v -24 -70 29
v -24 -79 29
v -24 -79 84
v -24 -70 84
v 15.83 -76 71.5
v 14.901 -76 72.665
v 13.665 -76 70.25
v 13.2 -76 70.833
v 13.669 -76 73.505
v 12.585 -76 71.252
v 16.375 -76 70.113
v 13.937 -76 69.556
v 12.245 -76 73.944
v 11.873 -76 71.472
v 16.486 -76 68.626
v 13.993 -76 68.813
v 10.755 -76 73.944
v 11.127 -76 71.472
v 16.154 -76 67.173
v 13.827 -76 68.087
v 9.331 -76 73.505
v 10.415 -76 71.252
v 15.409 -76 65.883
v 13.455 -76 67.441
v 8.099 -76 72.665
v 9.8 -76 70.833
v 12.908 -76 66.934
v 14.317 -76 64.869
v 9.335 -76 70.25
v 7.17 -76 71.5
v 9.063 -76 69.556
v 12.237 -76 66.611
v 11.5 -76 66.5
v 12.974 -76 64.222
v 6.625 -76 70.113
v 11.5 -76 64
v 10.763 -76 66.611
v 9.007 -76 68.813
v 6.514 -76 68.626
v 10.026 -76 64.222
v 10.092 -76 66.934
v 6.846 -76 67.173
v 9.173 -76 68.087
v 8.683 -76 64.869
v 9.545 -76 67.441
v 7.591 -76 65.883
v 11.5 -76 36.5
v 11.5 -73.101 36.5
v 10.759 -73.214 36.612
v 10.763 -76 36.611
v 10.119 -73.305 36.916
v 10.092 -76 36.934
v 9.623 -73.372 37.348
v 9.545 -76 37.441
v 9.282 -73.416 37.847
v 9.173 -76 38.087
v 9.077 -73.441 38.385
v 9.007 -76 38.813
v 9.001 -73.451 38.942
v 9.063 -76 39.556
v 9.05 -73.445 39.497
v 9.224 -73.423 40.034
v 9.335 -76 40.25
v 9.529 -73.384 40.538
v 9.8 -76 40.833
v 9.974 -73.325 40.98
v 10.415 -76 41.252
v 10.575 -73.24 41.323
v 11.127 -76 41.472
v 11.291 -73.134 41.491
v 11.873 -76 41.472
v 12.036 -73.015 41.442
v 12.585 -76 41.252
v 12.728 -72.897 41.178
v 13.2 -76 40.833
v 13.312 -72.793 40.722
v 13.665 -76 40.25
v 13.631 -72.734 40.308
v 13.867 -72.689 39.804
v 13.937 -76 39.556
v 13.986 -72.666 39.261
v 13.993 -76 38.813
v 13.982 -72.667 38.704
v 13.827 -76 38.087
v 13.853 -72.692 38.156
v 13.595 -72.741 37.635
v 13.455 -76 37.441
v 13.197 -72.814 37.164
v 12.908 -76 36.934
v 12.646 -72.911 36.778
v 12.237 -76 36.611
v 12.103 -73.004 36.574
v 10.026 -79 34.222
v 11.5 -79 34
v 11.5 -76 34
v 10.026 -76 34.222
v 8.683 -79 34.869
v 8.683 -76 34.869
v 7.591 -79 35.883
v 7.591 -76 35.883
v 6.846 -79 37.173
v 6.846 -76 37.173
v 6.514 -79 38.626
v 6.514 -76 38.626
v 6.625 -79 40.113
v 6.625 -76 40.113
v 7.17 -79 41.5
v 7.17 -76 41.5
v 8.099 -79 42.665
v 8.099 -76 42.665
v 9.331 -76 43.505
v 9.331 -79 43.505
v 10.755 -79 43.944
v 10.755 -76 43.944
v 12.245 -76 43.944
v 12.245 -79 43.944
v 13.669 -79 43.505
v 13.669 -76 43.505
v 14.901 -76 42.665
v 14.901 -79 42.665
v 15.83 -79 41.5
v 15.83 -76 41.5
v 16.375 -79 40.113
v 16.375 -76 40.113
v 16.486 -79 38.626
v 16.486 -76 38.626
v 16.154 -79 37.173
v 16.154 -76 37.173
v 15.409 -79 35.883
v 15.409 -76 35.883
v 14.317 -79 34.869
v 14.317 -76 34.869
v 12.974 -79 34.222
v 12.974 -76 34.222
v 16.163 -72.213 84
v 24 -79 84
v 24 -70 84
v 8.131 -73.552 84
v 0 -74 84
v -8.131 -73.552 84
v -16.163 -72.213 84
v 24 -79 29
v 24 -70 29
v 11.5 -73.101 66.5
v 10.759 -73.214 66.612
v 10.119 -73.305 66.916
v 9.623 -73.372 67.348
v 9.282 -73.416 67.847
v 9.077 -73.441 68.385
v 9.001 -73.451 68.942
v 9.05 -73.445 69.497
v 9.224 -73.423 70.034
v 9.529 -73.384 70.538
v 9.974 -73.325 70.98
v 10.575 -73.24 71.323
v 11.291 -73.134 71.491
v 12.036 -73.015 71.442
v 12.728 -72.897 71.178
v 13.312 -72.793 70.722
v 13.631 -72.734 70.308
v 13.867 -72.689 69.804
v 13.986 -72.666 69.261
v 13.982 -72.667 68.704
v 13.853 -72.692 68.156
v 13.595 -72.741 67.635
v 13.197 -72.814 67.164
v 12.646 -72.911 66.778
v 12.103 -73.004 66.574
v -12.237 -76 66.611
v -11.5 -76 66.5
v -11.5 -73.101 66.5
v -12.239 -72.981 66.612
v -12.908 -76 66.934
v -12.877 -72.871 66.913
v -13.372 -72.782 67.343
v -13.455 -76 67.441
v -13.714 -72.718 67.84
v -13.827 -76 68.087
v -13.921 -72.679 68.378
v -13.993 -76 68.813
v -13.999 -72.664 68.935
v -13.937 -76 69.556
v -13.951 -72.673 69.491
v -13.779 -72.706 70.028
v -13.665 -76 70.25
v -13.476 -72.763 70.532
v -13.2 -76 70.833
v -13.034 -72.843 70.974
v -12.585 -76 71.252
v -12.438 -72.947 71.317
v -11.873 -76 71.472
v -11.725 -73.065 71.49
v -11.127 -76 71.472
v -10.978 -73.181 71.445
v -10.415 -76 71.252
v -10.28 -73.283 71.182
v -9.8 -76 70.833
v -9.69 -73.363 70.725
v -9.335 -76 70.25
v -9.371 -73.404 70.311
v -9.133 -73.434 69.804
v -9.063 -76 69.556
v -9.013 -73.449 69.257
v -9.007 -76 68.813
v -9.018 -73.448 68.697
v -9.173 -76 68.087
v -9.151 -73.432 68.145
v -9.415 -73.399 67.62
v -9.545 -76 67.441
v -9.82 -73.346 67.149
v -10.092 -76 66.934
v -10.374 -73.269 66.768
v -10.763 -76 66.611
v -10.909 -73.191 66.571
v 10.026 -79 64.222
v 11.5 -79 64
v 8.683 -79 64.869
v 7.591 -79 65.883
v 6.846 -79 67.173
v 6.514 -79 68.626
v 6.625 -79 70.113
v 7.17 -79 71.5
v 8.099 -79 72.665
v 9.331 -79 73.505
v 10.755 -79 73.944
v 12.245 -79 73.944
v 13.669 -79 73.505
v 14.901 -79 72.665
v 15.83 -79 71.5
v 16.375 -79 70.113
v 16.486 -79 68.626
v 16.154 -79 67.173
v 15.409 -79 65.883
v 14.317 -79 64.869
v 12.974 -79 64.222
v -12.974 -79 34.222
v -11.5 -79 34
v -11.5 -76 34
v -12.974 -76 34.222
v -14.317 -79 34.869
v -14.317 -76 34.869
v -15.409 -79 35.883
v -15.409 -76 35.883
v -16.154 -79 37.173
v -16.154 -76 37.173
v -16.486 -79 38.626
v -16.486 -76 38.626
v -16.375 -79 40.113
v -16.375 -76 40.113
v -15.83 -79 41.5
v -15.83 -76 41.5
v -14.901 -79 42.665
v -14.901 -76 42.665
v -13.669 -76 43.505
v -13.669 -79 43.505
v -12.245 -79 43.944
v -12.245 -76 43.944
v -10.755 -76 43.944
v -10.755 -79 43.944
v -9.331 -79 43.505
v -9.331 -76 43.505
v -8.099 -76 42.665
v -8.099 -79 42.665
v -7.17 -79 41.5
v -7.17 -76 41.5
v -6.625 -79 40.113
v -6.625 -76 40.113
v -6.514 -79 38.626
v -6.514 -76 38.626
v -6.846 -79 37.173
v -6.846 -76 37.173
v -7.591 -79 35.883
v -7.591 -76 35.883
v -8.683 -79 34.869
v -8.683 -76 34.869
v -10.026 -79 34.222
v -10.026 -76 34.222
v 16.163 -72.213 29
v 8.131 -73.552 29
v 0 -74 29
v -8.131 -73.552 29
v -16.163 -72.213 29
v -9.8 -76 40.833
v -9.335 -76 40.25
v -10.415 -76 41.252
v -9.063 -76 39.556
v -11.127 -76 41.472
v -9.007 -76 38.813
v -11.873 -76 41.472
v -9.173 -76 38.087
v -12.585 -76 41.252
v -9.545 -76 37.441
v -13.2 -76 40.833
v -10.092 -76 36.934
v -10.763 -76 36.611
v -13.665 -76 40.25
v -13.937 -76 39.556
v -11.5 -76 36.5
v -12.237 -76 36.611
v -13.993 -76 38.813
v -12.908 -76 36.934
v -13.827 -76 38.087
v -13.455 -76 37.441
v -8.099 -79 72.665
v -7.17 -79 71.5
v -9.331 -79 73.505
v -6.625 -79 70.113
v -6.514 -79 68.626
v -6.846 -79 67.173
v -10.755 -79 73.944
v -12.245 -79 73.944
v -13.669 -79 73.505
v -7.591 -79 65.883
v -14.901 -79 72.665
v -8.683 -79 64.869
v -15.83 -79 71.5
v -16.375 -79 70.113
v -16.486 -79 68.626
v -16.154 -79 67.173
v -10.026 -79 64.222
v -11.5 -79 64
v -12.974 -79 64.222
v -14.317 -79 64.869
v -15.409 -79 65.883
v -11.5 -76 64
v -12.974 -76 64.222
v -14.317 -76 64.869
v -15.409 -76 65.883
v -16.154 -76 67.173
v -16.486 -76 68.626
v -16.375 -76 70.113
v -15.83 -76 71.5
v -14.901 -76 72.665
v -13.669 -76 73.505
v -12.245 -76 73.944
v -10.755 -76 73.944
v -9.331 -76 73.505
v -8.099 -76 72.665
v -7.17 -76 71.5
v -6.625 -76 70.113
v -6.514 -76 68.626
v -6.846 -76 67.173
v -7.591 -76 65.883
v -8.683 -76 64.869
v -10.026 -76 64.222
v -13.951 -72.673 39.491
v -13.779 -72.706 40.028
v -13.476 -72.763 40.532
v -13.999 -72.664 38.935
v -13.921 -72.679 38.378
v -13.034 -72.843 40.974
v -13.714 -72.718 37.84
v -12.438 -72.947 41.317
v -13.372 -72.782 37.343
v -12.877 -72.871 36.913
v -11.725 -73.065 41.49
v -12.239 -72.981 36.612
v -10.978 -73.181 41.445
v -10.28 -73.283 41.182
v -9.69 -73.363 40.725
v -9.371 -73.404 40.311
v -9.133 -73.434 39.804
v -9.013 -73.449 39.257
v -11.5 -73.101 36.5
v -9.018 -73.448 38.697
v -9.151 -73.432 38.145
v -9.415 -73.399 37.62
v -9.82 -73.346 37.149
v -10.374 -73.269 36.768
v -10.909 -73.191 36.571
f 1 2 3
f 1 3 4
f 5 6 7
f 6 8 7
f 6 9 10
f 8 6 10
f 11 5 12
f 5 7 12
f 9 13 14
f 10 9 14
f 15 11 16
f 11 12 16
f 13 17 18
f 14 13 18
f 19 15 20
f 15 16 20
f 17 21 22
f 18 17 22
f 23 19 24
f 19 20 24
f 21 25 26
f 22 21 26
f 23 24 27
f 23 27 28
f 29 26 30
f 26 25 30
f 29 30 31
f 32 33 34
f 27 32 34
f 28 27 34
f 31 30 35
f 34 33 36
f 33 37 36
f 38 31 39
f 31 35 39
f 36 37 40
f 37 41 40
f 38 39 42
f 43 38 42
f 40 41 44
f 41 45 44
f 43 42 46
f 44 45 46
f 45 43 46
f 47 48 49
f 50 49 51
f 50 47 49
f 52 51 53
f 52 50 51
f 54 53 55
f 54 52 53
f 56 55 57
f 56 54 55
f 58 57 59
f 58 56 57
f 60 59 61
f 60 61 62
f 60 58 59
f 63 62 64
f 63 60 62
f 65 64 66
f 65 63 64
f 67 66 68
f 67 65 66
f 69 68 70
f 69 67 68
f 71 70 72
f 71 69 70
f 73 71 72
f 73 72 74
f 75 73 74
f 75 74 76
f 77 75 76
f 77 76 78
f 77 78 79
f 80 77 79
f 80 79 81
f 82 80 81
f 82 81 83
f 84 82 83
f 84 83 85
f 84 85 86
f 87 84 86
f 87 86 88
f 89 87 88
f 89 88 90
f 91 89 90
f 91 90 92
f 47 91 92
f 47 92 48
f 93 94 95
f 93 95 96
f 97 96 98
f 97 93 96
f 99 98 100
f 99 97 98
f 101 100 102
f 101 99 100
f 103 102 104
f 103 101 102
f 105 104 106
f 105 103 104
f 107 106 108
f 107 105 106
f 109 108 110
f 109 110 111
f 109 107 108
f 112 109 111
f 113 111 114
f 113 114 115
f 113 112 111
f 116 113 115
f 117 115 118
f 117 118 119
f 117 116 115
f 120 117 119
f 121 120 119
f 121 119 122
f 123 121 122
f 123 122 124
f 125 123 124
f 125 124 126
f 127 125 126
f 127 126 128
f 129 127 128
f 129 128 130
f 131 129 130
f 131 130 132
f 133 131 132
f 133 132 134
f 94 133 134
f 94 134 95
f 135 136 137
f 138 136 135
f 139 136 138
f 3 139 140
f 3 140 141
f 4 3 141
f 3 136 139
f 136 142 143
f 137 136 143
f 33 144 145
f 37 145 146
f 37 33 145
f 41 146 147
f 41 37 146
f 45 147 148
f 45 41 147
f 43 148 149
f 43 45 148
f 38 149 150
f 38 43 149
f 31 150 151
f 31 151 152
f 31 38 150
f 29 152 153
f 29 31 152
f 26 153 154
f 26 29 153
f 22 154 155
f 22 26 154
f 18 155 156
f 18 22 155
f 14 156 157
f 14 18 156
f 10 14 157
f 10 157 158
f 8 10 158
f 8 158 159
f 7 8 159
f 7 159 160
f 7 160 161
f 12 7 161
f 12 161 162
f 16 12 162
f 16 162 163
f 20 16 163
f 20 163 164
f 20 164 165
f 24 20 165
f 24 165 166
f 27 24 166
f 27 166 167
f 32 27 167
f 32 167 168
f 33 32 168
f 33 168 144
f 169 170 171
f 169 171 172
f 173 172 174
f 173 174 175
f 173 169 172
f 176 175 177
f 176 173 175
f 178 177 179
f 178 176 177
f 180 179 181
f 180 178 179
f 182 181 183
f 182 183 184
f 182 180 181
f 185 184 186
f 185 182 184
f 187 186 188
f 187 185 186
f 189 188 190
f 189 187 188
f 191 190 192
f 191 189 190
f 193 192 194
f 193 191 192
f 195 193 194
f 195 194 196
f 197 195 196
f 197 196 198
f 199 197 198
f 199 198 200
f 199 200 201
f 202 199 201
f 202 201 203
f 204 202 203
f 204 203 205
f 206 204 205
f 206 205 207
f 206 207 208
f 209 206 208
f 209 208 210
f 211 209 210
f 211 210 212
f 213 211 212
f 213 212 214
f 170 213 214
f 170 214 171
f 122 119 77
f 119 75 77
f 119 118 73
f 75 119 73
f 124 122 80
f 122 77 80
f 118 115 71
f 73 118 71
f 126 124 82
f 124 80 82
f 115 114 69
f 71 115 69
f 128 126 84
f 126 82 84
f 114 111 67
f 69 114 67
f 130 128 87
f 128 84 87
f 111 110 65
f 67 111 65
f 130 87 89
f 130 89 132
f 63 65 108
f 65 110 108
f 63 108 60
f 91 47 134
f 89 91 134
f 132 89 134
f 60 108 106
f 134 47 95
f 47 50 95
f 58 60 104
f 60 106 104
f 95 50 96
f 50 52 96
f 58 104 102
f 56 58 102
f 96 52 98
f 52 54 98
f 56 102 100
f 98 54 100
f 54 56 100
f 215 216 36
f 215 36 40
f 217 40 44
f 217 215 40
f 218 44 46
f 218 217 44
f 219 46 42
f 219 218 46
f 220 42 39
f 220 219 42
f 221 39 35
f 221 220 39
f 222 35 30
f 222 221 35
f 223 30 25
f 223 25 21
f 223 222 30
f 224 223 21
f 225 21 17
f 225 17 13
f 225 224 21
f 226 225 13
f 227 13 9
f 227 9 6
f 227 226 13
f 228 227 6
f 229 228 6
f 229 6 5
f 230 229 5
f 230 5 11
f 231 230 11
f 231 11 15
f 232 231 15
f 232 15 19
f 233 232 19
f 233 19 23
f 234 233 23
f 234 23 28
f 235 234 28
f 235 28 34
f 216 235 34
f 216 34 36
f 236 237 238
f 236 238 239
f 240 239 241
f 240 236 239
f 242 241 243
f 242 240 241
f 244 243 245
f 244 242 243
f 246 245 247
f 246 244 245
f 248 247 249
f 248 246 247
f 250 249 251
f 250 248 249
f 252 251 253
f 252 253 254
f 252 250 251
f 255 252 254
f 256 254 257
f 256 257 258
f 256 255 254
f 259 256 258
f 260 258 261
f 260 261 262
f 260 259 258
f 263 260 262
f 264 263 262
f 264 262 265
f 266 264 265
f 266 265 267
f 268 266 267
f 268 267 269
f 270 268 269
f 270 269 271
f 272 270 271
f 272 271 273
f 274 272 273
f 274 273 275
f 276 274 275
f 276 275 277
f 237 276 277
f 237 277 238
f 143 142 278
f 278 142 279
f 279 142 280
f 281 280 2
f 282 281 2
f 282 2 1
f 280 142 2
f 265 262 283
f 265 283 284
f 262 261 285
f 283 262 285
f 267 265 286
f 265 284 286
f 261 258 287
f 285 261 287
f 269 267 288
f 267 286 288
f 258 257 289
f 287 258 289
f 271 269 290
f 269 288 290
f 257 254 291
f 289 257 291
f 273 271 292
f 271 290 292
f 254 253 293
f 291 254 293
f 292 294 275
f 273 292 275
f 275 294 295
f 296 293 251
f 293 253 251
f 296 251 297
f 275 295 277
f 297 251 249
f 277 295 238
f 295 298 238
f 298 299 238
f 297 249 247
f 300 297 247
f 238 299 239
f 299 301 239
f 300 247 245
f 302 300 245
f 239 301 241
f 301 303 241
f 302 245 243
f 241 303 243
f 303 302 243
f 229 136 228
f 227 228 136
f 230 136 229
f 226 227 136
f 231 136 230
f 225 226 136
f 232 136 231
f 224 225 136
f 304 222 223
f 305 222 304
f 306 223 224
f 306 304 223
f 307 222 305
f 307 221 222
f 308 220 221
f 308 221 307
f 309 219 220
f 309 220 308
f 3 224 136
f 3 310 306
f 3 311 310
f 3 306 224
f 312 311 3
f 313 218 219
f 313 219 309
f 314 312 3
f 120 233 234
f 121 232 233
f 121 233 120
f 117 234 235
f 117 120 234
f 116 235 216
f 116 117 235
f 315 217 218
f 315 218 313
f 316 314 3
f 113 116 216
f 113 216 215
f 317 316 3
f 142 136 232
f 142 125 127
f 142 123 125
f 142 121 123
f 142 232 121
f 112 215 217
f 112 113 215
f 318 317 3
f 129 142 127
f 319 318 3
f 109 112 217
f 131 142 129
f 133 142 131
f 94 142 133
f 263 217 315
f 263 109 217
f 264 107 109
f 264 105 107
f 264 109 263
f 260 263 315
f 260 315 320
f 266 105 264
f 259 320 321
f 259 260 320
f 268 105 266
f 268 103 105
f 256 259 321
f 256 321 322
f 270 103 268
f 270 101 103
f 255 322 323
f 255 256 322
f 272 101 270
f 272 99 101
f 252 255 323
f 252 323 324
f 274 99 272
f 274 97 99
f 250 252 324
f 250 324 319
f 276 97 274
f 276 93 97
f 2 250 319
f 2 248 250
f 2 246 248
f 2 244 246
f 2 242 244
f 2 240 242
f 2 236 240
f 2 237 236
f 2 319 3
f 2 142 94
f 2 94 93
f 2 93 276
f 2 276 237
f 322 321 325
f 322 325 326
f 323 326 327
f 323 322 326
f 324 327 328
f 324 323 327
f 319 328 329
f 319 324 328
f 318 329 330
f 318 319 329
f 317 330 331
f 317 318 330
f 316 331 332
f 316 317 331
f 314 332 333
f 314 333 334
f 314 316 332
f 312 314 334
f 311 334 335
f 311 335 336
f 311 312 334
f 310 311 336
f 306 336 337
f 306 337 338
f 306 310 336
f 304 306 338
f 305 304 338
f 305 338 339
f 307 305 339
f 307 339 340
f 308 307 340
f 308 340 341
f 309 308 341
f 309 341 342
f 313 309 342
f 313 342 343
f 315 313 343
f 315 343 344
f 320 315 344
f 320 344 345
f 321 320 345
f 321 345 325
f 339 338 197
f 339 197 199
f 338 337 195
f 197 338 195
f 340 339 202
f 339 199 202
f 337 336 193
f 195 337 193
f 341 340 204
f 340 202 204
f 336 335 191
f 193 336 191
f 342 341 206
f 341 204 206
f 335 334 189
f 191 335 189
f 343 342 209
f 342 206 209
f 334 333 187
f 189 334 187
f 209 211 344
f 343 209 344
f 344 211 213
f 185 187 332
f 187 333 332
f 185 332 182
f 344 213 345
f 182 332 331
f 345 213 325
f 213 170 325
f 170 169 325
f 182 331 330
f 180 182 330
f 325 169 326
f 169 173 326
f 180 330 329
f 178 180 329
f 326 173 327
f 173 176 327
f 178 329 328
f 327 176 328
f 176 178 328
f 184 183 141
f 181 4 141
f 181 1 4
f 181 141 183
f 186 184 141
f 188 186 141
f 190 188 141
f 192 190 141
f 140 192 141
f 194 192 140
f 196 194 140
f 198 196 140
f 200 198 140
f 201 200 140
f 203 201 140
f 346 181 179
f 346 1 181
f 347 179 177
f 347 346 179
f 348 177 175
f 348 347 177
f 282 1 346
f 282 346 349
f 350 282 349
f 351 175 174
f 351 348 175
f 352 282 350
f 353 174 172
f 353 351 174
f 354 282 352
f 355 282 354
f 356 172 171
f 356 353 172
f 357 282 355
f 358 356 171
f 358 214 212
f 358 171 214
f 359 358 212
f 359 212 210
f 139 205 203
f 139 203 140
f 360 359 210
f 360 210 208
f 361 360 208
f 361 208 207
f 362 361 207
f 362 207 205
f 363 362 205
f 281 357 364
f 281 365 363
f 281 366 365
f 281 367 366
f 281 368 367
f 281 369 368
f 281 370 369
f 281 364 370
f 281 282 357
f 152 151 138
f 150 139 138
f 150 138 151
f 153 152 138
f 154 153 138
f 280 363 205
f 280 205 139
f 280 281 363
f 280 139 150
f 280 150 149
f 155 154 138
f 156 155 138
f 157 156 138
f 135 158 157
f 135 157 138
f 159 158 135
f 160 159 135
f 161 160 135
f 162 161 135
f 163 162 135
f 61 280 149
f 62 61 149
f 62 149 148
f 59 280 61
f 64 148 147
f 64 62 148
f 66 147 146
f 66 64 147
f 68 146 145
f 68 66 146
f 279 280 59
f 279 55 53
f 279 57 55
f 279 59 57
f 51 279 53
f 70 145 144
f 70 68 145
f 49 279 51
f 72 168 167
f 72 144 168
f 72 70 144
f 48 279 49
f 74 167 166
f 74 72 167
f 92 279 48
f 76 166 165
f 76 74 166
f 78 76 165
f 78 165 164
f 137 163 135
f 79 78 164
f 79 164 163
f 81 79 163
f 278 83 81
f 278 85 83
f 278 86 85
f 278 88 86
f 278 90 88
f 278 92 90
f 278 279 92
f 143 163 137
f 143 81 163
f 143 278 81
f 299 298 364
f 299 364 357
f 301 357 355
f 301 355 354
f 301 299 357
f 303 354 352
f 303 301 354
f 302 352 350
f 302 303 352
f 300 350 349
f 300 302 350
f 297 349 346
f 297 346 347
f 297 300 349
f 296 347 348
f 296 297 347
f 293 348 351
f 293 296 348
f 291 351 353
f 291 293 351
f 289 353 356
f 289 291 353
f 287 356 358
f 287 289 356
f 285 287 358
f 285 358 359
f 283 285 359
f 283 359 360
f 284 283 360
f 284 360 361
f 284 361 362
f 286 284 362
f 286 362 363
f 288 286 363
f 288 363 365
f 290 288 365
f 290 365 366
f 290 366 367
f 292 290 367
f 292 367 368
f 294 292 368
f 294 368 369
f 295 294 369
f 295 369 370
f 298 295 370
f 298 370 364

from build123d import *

# Parameters (mm, degrees)
CYLINDER1836_R              = 5
CYLINDER1836_DEPTH          = 5
CYLINDER1839_R              = 5
CYLINDER1839_DEPTH          = 5
COMPOUND945_PLACEMENT_ANGLE = 90
CYLINDER1837_R              = 5
CYLINDER1837_DEPTH          = 5
CYLINDER1838_R              = 5
CYLINDER1838_DEPTH          = 5
COMPOUND944_PLACEMENT_ANGLE = 90
CYLINDER1834_R              = 2.5
CYLINDER1834_DEPTH          = 40
CYLINDER1835_R              = 2.5
CYLINDER1835_DEPTH          = 40
COMPOUND934_PLACEMENT_ANGLE = 90
CYLINDER1832_R              = 2.5
CYLINDER1832_DEPTH          = 40
CYLINDER1833_R              = 2.5
CYLINDER1833_DEPTH          = 40
COMPOUND933_PLACEMENT_ANGLE = 90
CYLINDER970_R               = 74
CYLINDER970_DEPTH           = 64
BOX481_W                    = 10
BOX481_H                    = 48
BOX481_DEPTH                = 55


with BuildPart() as v_lec1836:
    # Cylinder1836 → Cylinder1836 (new body)
    with BuildSketch(Plane(origin=(-86, -10, 69), x_dir=(0, 0, -1), z_dir=(1, 0, 0))):
        Circle(CYLINDER1836_R)
    extrude(amount=CYLINDER1836_DEPTH)


with BuildPart() as compound945:
    # Cylinder1839 → Cylinder1839 (new body)
    with BuildSketch(Plane(origin=(-86, -10, 39), x_dir=(0, 0, -1), z_dir=(1, 0, 0))):
        Circle(CYLINDER1839_R)
    extrude(amount=CYLINDER1839_DEPTH)

    # Compound945: union Válec1836
    add(v_lec1836.part)


with BuildPart() as compound945_1:
    # Compound945 placement: moved
    add(compound945.part.moved(Location((-21.5, 0, 0))).rotate(Axis((-21.5, 0, 0), (0, 0, 1)), COMPOUND945_PLACEMENT_ANGLE))


with BuildPart() as v_lec1837:
    # Cylinder1837 → Cylinder1837 (new body)
    with BuildSketch(Plane(origin=(-86, -10, 69), x_dir=(0, 0, -1), z_dir=(1, 0, 0))):
        Circle(CYLINDER1837_R)
    extrude(amount=CYLINDER1837_DEPTH)


with BuildPart() as compound946:
    # Cylinder1838 → Cylinder1838 (new body)
    with BuildSketch(Plane(origin=(-86, -10, 39), x_dir=(0, 0, -1), z_dir=(1, 0, 0))):
        Circle(CYLINDER1838_R)
    extrude(amount=CYLINDER1838_DEPTH)

    # Compound944: union Válec1837
    add(v_lec1837.part)


with BuildPart() as compound946_1:
    # Compound944 placement: moved
    add(compound946.part.moved(Location((1.5, 0, 0))).rotate(Axis((1.5, 0, 0), (0, 0, 1)), COMPOUND944_PLACEMENT_ANGLE))

    # Compound946: union Compound945
    add(compound945_1.part)


with BuildPart() as compound946_2:
    # Compound946 placement: moved
    add(compound946_1.part.moved(Location((0, 5, 0))))


with BuildPart() as v_lec1834:
    # Cylinder1834 → Cylinder1834 (new body)
    with BuildSketch(Plane(origin=(-86, -10, 69), x_dir=(0, 0, -1), z_dir=(1, 0, 0))):
        Circle(CYLINDER1834_R)
    extrude(amount=CYLINDER1834_DEPTH)


with BuildPart() as compound934:
    # Cylinder1835 → Cylinder1835 (new body)
    with BuildSketch(Plane(origin=(-86, -10, 39), x_dir=(0, 0, -1), z_dir=(1, 0, 0))):
        Circle(CYLINDER1835_R)
    extrude(amount=CYLINDER1835_DEPTH)

    # Compound934: union Válec1834
    add(v_lec1834.part)


with BuildPart() as compound934_1:
    # Compound934 placement: moved
    add(compound934.part.moved(Location((-21.5, 0, 0))).rotate(Axis((-21.5, 0, 0), (0, 0, 1)), COMPOUND934_PLACEMENT_ANGLE))


with BuildPart() as v_lec1832:
    # Cylinder1832 → Cylinder1832 (new body)
    with BuildSketch(Plane(origin=(-86, -10, 69), x_dir=(0, 0, -1), z_dir=(1, 0, 0))):
        Circle(CYLINDER1832_R)
    extrude(amount=CYLINDER1832_DEPTH)


with BuildPart() as compound939:
    # Cylinder1833 → Cylinder1833 (new body)
    with BuildSketch(Plane(origin=(-86, -10, 39), x_dir=(0, 0, -1), z_dir=(1, 0, 0))):
        Circle(CYLINDER1833_R)
    extrude(amount=CYLINDER1833_DEPTH)

    # Compound933: union Válec1832
    add(v_lec1832.part)


with BuildPart() as compound939_1:
    # Compound933 placement: moved
    add(compound939.part.moved(Location((1.5, 0, 0))).rotate(Axis((1.5, 0, 0), (0, 0, 1)), COMPOUND933_PLACEMENT_ANGLE))

    # Compound939: union Compound934
    add(compound934_1.part)


with BuildPart() as v_lec970:
    # Cylinder970 → Cylinder970 (new body)
    with BuildSketch(Plane.XY.offset(27)):
        Circle(CYLINDER970_R)
    extrude(amount=CYLINDER970_DEPTH)


with BuildPart() as cut596:
    # Box481 → Box481 (new body)
    with BuildSketch(Plane(origin=(24, -79, 29), x_dir=(0, 1, 0), z_dir=(0, 0, 1))):
        with Locations((5, 24)):
            Rectangle(BOX481_W, BOX481_H)
    extrude(amount=BOX481_DEPTH)

    # Cut450: cut Válec970
    add(v_lec970.part, mode=Mode.SUBTRACT)

    # Cut595: cut Compound939
    add(compound939_1.part, mode=Mode.SUBTRACT)

    # Cut596: cut Compound946
    add(compound946_2.part, mode=Mode.SUBTRACT)


solid = cut596.part
